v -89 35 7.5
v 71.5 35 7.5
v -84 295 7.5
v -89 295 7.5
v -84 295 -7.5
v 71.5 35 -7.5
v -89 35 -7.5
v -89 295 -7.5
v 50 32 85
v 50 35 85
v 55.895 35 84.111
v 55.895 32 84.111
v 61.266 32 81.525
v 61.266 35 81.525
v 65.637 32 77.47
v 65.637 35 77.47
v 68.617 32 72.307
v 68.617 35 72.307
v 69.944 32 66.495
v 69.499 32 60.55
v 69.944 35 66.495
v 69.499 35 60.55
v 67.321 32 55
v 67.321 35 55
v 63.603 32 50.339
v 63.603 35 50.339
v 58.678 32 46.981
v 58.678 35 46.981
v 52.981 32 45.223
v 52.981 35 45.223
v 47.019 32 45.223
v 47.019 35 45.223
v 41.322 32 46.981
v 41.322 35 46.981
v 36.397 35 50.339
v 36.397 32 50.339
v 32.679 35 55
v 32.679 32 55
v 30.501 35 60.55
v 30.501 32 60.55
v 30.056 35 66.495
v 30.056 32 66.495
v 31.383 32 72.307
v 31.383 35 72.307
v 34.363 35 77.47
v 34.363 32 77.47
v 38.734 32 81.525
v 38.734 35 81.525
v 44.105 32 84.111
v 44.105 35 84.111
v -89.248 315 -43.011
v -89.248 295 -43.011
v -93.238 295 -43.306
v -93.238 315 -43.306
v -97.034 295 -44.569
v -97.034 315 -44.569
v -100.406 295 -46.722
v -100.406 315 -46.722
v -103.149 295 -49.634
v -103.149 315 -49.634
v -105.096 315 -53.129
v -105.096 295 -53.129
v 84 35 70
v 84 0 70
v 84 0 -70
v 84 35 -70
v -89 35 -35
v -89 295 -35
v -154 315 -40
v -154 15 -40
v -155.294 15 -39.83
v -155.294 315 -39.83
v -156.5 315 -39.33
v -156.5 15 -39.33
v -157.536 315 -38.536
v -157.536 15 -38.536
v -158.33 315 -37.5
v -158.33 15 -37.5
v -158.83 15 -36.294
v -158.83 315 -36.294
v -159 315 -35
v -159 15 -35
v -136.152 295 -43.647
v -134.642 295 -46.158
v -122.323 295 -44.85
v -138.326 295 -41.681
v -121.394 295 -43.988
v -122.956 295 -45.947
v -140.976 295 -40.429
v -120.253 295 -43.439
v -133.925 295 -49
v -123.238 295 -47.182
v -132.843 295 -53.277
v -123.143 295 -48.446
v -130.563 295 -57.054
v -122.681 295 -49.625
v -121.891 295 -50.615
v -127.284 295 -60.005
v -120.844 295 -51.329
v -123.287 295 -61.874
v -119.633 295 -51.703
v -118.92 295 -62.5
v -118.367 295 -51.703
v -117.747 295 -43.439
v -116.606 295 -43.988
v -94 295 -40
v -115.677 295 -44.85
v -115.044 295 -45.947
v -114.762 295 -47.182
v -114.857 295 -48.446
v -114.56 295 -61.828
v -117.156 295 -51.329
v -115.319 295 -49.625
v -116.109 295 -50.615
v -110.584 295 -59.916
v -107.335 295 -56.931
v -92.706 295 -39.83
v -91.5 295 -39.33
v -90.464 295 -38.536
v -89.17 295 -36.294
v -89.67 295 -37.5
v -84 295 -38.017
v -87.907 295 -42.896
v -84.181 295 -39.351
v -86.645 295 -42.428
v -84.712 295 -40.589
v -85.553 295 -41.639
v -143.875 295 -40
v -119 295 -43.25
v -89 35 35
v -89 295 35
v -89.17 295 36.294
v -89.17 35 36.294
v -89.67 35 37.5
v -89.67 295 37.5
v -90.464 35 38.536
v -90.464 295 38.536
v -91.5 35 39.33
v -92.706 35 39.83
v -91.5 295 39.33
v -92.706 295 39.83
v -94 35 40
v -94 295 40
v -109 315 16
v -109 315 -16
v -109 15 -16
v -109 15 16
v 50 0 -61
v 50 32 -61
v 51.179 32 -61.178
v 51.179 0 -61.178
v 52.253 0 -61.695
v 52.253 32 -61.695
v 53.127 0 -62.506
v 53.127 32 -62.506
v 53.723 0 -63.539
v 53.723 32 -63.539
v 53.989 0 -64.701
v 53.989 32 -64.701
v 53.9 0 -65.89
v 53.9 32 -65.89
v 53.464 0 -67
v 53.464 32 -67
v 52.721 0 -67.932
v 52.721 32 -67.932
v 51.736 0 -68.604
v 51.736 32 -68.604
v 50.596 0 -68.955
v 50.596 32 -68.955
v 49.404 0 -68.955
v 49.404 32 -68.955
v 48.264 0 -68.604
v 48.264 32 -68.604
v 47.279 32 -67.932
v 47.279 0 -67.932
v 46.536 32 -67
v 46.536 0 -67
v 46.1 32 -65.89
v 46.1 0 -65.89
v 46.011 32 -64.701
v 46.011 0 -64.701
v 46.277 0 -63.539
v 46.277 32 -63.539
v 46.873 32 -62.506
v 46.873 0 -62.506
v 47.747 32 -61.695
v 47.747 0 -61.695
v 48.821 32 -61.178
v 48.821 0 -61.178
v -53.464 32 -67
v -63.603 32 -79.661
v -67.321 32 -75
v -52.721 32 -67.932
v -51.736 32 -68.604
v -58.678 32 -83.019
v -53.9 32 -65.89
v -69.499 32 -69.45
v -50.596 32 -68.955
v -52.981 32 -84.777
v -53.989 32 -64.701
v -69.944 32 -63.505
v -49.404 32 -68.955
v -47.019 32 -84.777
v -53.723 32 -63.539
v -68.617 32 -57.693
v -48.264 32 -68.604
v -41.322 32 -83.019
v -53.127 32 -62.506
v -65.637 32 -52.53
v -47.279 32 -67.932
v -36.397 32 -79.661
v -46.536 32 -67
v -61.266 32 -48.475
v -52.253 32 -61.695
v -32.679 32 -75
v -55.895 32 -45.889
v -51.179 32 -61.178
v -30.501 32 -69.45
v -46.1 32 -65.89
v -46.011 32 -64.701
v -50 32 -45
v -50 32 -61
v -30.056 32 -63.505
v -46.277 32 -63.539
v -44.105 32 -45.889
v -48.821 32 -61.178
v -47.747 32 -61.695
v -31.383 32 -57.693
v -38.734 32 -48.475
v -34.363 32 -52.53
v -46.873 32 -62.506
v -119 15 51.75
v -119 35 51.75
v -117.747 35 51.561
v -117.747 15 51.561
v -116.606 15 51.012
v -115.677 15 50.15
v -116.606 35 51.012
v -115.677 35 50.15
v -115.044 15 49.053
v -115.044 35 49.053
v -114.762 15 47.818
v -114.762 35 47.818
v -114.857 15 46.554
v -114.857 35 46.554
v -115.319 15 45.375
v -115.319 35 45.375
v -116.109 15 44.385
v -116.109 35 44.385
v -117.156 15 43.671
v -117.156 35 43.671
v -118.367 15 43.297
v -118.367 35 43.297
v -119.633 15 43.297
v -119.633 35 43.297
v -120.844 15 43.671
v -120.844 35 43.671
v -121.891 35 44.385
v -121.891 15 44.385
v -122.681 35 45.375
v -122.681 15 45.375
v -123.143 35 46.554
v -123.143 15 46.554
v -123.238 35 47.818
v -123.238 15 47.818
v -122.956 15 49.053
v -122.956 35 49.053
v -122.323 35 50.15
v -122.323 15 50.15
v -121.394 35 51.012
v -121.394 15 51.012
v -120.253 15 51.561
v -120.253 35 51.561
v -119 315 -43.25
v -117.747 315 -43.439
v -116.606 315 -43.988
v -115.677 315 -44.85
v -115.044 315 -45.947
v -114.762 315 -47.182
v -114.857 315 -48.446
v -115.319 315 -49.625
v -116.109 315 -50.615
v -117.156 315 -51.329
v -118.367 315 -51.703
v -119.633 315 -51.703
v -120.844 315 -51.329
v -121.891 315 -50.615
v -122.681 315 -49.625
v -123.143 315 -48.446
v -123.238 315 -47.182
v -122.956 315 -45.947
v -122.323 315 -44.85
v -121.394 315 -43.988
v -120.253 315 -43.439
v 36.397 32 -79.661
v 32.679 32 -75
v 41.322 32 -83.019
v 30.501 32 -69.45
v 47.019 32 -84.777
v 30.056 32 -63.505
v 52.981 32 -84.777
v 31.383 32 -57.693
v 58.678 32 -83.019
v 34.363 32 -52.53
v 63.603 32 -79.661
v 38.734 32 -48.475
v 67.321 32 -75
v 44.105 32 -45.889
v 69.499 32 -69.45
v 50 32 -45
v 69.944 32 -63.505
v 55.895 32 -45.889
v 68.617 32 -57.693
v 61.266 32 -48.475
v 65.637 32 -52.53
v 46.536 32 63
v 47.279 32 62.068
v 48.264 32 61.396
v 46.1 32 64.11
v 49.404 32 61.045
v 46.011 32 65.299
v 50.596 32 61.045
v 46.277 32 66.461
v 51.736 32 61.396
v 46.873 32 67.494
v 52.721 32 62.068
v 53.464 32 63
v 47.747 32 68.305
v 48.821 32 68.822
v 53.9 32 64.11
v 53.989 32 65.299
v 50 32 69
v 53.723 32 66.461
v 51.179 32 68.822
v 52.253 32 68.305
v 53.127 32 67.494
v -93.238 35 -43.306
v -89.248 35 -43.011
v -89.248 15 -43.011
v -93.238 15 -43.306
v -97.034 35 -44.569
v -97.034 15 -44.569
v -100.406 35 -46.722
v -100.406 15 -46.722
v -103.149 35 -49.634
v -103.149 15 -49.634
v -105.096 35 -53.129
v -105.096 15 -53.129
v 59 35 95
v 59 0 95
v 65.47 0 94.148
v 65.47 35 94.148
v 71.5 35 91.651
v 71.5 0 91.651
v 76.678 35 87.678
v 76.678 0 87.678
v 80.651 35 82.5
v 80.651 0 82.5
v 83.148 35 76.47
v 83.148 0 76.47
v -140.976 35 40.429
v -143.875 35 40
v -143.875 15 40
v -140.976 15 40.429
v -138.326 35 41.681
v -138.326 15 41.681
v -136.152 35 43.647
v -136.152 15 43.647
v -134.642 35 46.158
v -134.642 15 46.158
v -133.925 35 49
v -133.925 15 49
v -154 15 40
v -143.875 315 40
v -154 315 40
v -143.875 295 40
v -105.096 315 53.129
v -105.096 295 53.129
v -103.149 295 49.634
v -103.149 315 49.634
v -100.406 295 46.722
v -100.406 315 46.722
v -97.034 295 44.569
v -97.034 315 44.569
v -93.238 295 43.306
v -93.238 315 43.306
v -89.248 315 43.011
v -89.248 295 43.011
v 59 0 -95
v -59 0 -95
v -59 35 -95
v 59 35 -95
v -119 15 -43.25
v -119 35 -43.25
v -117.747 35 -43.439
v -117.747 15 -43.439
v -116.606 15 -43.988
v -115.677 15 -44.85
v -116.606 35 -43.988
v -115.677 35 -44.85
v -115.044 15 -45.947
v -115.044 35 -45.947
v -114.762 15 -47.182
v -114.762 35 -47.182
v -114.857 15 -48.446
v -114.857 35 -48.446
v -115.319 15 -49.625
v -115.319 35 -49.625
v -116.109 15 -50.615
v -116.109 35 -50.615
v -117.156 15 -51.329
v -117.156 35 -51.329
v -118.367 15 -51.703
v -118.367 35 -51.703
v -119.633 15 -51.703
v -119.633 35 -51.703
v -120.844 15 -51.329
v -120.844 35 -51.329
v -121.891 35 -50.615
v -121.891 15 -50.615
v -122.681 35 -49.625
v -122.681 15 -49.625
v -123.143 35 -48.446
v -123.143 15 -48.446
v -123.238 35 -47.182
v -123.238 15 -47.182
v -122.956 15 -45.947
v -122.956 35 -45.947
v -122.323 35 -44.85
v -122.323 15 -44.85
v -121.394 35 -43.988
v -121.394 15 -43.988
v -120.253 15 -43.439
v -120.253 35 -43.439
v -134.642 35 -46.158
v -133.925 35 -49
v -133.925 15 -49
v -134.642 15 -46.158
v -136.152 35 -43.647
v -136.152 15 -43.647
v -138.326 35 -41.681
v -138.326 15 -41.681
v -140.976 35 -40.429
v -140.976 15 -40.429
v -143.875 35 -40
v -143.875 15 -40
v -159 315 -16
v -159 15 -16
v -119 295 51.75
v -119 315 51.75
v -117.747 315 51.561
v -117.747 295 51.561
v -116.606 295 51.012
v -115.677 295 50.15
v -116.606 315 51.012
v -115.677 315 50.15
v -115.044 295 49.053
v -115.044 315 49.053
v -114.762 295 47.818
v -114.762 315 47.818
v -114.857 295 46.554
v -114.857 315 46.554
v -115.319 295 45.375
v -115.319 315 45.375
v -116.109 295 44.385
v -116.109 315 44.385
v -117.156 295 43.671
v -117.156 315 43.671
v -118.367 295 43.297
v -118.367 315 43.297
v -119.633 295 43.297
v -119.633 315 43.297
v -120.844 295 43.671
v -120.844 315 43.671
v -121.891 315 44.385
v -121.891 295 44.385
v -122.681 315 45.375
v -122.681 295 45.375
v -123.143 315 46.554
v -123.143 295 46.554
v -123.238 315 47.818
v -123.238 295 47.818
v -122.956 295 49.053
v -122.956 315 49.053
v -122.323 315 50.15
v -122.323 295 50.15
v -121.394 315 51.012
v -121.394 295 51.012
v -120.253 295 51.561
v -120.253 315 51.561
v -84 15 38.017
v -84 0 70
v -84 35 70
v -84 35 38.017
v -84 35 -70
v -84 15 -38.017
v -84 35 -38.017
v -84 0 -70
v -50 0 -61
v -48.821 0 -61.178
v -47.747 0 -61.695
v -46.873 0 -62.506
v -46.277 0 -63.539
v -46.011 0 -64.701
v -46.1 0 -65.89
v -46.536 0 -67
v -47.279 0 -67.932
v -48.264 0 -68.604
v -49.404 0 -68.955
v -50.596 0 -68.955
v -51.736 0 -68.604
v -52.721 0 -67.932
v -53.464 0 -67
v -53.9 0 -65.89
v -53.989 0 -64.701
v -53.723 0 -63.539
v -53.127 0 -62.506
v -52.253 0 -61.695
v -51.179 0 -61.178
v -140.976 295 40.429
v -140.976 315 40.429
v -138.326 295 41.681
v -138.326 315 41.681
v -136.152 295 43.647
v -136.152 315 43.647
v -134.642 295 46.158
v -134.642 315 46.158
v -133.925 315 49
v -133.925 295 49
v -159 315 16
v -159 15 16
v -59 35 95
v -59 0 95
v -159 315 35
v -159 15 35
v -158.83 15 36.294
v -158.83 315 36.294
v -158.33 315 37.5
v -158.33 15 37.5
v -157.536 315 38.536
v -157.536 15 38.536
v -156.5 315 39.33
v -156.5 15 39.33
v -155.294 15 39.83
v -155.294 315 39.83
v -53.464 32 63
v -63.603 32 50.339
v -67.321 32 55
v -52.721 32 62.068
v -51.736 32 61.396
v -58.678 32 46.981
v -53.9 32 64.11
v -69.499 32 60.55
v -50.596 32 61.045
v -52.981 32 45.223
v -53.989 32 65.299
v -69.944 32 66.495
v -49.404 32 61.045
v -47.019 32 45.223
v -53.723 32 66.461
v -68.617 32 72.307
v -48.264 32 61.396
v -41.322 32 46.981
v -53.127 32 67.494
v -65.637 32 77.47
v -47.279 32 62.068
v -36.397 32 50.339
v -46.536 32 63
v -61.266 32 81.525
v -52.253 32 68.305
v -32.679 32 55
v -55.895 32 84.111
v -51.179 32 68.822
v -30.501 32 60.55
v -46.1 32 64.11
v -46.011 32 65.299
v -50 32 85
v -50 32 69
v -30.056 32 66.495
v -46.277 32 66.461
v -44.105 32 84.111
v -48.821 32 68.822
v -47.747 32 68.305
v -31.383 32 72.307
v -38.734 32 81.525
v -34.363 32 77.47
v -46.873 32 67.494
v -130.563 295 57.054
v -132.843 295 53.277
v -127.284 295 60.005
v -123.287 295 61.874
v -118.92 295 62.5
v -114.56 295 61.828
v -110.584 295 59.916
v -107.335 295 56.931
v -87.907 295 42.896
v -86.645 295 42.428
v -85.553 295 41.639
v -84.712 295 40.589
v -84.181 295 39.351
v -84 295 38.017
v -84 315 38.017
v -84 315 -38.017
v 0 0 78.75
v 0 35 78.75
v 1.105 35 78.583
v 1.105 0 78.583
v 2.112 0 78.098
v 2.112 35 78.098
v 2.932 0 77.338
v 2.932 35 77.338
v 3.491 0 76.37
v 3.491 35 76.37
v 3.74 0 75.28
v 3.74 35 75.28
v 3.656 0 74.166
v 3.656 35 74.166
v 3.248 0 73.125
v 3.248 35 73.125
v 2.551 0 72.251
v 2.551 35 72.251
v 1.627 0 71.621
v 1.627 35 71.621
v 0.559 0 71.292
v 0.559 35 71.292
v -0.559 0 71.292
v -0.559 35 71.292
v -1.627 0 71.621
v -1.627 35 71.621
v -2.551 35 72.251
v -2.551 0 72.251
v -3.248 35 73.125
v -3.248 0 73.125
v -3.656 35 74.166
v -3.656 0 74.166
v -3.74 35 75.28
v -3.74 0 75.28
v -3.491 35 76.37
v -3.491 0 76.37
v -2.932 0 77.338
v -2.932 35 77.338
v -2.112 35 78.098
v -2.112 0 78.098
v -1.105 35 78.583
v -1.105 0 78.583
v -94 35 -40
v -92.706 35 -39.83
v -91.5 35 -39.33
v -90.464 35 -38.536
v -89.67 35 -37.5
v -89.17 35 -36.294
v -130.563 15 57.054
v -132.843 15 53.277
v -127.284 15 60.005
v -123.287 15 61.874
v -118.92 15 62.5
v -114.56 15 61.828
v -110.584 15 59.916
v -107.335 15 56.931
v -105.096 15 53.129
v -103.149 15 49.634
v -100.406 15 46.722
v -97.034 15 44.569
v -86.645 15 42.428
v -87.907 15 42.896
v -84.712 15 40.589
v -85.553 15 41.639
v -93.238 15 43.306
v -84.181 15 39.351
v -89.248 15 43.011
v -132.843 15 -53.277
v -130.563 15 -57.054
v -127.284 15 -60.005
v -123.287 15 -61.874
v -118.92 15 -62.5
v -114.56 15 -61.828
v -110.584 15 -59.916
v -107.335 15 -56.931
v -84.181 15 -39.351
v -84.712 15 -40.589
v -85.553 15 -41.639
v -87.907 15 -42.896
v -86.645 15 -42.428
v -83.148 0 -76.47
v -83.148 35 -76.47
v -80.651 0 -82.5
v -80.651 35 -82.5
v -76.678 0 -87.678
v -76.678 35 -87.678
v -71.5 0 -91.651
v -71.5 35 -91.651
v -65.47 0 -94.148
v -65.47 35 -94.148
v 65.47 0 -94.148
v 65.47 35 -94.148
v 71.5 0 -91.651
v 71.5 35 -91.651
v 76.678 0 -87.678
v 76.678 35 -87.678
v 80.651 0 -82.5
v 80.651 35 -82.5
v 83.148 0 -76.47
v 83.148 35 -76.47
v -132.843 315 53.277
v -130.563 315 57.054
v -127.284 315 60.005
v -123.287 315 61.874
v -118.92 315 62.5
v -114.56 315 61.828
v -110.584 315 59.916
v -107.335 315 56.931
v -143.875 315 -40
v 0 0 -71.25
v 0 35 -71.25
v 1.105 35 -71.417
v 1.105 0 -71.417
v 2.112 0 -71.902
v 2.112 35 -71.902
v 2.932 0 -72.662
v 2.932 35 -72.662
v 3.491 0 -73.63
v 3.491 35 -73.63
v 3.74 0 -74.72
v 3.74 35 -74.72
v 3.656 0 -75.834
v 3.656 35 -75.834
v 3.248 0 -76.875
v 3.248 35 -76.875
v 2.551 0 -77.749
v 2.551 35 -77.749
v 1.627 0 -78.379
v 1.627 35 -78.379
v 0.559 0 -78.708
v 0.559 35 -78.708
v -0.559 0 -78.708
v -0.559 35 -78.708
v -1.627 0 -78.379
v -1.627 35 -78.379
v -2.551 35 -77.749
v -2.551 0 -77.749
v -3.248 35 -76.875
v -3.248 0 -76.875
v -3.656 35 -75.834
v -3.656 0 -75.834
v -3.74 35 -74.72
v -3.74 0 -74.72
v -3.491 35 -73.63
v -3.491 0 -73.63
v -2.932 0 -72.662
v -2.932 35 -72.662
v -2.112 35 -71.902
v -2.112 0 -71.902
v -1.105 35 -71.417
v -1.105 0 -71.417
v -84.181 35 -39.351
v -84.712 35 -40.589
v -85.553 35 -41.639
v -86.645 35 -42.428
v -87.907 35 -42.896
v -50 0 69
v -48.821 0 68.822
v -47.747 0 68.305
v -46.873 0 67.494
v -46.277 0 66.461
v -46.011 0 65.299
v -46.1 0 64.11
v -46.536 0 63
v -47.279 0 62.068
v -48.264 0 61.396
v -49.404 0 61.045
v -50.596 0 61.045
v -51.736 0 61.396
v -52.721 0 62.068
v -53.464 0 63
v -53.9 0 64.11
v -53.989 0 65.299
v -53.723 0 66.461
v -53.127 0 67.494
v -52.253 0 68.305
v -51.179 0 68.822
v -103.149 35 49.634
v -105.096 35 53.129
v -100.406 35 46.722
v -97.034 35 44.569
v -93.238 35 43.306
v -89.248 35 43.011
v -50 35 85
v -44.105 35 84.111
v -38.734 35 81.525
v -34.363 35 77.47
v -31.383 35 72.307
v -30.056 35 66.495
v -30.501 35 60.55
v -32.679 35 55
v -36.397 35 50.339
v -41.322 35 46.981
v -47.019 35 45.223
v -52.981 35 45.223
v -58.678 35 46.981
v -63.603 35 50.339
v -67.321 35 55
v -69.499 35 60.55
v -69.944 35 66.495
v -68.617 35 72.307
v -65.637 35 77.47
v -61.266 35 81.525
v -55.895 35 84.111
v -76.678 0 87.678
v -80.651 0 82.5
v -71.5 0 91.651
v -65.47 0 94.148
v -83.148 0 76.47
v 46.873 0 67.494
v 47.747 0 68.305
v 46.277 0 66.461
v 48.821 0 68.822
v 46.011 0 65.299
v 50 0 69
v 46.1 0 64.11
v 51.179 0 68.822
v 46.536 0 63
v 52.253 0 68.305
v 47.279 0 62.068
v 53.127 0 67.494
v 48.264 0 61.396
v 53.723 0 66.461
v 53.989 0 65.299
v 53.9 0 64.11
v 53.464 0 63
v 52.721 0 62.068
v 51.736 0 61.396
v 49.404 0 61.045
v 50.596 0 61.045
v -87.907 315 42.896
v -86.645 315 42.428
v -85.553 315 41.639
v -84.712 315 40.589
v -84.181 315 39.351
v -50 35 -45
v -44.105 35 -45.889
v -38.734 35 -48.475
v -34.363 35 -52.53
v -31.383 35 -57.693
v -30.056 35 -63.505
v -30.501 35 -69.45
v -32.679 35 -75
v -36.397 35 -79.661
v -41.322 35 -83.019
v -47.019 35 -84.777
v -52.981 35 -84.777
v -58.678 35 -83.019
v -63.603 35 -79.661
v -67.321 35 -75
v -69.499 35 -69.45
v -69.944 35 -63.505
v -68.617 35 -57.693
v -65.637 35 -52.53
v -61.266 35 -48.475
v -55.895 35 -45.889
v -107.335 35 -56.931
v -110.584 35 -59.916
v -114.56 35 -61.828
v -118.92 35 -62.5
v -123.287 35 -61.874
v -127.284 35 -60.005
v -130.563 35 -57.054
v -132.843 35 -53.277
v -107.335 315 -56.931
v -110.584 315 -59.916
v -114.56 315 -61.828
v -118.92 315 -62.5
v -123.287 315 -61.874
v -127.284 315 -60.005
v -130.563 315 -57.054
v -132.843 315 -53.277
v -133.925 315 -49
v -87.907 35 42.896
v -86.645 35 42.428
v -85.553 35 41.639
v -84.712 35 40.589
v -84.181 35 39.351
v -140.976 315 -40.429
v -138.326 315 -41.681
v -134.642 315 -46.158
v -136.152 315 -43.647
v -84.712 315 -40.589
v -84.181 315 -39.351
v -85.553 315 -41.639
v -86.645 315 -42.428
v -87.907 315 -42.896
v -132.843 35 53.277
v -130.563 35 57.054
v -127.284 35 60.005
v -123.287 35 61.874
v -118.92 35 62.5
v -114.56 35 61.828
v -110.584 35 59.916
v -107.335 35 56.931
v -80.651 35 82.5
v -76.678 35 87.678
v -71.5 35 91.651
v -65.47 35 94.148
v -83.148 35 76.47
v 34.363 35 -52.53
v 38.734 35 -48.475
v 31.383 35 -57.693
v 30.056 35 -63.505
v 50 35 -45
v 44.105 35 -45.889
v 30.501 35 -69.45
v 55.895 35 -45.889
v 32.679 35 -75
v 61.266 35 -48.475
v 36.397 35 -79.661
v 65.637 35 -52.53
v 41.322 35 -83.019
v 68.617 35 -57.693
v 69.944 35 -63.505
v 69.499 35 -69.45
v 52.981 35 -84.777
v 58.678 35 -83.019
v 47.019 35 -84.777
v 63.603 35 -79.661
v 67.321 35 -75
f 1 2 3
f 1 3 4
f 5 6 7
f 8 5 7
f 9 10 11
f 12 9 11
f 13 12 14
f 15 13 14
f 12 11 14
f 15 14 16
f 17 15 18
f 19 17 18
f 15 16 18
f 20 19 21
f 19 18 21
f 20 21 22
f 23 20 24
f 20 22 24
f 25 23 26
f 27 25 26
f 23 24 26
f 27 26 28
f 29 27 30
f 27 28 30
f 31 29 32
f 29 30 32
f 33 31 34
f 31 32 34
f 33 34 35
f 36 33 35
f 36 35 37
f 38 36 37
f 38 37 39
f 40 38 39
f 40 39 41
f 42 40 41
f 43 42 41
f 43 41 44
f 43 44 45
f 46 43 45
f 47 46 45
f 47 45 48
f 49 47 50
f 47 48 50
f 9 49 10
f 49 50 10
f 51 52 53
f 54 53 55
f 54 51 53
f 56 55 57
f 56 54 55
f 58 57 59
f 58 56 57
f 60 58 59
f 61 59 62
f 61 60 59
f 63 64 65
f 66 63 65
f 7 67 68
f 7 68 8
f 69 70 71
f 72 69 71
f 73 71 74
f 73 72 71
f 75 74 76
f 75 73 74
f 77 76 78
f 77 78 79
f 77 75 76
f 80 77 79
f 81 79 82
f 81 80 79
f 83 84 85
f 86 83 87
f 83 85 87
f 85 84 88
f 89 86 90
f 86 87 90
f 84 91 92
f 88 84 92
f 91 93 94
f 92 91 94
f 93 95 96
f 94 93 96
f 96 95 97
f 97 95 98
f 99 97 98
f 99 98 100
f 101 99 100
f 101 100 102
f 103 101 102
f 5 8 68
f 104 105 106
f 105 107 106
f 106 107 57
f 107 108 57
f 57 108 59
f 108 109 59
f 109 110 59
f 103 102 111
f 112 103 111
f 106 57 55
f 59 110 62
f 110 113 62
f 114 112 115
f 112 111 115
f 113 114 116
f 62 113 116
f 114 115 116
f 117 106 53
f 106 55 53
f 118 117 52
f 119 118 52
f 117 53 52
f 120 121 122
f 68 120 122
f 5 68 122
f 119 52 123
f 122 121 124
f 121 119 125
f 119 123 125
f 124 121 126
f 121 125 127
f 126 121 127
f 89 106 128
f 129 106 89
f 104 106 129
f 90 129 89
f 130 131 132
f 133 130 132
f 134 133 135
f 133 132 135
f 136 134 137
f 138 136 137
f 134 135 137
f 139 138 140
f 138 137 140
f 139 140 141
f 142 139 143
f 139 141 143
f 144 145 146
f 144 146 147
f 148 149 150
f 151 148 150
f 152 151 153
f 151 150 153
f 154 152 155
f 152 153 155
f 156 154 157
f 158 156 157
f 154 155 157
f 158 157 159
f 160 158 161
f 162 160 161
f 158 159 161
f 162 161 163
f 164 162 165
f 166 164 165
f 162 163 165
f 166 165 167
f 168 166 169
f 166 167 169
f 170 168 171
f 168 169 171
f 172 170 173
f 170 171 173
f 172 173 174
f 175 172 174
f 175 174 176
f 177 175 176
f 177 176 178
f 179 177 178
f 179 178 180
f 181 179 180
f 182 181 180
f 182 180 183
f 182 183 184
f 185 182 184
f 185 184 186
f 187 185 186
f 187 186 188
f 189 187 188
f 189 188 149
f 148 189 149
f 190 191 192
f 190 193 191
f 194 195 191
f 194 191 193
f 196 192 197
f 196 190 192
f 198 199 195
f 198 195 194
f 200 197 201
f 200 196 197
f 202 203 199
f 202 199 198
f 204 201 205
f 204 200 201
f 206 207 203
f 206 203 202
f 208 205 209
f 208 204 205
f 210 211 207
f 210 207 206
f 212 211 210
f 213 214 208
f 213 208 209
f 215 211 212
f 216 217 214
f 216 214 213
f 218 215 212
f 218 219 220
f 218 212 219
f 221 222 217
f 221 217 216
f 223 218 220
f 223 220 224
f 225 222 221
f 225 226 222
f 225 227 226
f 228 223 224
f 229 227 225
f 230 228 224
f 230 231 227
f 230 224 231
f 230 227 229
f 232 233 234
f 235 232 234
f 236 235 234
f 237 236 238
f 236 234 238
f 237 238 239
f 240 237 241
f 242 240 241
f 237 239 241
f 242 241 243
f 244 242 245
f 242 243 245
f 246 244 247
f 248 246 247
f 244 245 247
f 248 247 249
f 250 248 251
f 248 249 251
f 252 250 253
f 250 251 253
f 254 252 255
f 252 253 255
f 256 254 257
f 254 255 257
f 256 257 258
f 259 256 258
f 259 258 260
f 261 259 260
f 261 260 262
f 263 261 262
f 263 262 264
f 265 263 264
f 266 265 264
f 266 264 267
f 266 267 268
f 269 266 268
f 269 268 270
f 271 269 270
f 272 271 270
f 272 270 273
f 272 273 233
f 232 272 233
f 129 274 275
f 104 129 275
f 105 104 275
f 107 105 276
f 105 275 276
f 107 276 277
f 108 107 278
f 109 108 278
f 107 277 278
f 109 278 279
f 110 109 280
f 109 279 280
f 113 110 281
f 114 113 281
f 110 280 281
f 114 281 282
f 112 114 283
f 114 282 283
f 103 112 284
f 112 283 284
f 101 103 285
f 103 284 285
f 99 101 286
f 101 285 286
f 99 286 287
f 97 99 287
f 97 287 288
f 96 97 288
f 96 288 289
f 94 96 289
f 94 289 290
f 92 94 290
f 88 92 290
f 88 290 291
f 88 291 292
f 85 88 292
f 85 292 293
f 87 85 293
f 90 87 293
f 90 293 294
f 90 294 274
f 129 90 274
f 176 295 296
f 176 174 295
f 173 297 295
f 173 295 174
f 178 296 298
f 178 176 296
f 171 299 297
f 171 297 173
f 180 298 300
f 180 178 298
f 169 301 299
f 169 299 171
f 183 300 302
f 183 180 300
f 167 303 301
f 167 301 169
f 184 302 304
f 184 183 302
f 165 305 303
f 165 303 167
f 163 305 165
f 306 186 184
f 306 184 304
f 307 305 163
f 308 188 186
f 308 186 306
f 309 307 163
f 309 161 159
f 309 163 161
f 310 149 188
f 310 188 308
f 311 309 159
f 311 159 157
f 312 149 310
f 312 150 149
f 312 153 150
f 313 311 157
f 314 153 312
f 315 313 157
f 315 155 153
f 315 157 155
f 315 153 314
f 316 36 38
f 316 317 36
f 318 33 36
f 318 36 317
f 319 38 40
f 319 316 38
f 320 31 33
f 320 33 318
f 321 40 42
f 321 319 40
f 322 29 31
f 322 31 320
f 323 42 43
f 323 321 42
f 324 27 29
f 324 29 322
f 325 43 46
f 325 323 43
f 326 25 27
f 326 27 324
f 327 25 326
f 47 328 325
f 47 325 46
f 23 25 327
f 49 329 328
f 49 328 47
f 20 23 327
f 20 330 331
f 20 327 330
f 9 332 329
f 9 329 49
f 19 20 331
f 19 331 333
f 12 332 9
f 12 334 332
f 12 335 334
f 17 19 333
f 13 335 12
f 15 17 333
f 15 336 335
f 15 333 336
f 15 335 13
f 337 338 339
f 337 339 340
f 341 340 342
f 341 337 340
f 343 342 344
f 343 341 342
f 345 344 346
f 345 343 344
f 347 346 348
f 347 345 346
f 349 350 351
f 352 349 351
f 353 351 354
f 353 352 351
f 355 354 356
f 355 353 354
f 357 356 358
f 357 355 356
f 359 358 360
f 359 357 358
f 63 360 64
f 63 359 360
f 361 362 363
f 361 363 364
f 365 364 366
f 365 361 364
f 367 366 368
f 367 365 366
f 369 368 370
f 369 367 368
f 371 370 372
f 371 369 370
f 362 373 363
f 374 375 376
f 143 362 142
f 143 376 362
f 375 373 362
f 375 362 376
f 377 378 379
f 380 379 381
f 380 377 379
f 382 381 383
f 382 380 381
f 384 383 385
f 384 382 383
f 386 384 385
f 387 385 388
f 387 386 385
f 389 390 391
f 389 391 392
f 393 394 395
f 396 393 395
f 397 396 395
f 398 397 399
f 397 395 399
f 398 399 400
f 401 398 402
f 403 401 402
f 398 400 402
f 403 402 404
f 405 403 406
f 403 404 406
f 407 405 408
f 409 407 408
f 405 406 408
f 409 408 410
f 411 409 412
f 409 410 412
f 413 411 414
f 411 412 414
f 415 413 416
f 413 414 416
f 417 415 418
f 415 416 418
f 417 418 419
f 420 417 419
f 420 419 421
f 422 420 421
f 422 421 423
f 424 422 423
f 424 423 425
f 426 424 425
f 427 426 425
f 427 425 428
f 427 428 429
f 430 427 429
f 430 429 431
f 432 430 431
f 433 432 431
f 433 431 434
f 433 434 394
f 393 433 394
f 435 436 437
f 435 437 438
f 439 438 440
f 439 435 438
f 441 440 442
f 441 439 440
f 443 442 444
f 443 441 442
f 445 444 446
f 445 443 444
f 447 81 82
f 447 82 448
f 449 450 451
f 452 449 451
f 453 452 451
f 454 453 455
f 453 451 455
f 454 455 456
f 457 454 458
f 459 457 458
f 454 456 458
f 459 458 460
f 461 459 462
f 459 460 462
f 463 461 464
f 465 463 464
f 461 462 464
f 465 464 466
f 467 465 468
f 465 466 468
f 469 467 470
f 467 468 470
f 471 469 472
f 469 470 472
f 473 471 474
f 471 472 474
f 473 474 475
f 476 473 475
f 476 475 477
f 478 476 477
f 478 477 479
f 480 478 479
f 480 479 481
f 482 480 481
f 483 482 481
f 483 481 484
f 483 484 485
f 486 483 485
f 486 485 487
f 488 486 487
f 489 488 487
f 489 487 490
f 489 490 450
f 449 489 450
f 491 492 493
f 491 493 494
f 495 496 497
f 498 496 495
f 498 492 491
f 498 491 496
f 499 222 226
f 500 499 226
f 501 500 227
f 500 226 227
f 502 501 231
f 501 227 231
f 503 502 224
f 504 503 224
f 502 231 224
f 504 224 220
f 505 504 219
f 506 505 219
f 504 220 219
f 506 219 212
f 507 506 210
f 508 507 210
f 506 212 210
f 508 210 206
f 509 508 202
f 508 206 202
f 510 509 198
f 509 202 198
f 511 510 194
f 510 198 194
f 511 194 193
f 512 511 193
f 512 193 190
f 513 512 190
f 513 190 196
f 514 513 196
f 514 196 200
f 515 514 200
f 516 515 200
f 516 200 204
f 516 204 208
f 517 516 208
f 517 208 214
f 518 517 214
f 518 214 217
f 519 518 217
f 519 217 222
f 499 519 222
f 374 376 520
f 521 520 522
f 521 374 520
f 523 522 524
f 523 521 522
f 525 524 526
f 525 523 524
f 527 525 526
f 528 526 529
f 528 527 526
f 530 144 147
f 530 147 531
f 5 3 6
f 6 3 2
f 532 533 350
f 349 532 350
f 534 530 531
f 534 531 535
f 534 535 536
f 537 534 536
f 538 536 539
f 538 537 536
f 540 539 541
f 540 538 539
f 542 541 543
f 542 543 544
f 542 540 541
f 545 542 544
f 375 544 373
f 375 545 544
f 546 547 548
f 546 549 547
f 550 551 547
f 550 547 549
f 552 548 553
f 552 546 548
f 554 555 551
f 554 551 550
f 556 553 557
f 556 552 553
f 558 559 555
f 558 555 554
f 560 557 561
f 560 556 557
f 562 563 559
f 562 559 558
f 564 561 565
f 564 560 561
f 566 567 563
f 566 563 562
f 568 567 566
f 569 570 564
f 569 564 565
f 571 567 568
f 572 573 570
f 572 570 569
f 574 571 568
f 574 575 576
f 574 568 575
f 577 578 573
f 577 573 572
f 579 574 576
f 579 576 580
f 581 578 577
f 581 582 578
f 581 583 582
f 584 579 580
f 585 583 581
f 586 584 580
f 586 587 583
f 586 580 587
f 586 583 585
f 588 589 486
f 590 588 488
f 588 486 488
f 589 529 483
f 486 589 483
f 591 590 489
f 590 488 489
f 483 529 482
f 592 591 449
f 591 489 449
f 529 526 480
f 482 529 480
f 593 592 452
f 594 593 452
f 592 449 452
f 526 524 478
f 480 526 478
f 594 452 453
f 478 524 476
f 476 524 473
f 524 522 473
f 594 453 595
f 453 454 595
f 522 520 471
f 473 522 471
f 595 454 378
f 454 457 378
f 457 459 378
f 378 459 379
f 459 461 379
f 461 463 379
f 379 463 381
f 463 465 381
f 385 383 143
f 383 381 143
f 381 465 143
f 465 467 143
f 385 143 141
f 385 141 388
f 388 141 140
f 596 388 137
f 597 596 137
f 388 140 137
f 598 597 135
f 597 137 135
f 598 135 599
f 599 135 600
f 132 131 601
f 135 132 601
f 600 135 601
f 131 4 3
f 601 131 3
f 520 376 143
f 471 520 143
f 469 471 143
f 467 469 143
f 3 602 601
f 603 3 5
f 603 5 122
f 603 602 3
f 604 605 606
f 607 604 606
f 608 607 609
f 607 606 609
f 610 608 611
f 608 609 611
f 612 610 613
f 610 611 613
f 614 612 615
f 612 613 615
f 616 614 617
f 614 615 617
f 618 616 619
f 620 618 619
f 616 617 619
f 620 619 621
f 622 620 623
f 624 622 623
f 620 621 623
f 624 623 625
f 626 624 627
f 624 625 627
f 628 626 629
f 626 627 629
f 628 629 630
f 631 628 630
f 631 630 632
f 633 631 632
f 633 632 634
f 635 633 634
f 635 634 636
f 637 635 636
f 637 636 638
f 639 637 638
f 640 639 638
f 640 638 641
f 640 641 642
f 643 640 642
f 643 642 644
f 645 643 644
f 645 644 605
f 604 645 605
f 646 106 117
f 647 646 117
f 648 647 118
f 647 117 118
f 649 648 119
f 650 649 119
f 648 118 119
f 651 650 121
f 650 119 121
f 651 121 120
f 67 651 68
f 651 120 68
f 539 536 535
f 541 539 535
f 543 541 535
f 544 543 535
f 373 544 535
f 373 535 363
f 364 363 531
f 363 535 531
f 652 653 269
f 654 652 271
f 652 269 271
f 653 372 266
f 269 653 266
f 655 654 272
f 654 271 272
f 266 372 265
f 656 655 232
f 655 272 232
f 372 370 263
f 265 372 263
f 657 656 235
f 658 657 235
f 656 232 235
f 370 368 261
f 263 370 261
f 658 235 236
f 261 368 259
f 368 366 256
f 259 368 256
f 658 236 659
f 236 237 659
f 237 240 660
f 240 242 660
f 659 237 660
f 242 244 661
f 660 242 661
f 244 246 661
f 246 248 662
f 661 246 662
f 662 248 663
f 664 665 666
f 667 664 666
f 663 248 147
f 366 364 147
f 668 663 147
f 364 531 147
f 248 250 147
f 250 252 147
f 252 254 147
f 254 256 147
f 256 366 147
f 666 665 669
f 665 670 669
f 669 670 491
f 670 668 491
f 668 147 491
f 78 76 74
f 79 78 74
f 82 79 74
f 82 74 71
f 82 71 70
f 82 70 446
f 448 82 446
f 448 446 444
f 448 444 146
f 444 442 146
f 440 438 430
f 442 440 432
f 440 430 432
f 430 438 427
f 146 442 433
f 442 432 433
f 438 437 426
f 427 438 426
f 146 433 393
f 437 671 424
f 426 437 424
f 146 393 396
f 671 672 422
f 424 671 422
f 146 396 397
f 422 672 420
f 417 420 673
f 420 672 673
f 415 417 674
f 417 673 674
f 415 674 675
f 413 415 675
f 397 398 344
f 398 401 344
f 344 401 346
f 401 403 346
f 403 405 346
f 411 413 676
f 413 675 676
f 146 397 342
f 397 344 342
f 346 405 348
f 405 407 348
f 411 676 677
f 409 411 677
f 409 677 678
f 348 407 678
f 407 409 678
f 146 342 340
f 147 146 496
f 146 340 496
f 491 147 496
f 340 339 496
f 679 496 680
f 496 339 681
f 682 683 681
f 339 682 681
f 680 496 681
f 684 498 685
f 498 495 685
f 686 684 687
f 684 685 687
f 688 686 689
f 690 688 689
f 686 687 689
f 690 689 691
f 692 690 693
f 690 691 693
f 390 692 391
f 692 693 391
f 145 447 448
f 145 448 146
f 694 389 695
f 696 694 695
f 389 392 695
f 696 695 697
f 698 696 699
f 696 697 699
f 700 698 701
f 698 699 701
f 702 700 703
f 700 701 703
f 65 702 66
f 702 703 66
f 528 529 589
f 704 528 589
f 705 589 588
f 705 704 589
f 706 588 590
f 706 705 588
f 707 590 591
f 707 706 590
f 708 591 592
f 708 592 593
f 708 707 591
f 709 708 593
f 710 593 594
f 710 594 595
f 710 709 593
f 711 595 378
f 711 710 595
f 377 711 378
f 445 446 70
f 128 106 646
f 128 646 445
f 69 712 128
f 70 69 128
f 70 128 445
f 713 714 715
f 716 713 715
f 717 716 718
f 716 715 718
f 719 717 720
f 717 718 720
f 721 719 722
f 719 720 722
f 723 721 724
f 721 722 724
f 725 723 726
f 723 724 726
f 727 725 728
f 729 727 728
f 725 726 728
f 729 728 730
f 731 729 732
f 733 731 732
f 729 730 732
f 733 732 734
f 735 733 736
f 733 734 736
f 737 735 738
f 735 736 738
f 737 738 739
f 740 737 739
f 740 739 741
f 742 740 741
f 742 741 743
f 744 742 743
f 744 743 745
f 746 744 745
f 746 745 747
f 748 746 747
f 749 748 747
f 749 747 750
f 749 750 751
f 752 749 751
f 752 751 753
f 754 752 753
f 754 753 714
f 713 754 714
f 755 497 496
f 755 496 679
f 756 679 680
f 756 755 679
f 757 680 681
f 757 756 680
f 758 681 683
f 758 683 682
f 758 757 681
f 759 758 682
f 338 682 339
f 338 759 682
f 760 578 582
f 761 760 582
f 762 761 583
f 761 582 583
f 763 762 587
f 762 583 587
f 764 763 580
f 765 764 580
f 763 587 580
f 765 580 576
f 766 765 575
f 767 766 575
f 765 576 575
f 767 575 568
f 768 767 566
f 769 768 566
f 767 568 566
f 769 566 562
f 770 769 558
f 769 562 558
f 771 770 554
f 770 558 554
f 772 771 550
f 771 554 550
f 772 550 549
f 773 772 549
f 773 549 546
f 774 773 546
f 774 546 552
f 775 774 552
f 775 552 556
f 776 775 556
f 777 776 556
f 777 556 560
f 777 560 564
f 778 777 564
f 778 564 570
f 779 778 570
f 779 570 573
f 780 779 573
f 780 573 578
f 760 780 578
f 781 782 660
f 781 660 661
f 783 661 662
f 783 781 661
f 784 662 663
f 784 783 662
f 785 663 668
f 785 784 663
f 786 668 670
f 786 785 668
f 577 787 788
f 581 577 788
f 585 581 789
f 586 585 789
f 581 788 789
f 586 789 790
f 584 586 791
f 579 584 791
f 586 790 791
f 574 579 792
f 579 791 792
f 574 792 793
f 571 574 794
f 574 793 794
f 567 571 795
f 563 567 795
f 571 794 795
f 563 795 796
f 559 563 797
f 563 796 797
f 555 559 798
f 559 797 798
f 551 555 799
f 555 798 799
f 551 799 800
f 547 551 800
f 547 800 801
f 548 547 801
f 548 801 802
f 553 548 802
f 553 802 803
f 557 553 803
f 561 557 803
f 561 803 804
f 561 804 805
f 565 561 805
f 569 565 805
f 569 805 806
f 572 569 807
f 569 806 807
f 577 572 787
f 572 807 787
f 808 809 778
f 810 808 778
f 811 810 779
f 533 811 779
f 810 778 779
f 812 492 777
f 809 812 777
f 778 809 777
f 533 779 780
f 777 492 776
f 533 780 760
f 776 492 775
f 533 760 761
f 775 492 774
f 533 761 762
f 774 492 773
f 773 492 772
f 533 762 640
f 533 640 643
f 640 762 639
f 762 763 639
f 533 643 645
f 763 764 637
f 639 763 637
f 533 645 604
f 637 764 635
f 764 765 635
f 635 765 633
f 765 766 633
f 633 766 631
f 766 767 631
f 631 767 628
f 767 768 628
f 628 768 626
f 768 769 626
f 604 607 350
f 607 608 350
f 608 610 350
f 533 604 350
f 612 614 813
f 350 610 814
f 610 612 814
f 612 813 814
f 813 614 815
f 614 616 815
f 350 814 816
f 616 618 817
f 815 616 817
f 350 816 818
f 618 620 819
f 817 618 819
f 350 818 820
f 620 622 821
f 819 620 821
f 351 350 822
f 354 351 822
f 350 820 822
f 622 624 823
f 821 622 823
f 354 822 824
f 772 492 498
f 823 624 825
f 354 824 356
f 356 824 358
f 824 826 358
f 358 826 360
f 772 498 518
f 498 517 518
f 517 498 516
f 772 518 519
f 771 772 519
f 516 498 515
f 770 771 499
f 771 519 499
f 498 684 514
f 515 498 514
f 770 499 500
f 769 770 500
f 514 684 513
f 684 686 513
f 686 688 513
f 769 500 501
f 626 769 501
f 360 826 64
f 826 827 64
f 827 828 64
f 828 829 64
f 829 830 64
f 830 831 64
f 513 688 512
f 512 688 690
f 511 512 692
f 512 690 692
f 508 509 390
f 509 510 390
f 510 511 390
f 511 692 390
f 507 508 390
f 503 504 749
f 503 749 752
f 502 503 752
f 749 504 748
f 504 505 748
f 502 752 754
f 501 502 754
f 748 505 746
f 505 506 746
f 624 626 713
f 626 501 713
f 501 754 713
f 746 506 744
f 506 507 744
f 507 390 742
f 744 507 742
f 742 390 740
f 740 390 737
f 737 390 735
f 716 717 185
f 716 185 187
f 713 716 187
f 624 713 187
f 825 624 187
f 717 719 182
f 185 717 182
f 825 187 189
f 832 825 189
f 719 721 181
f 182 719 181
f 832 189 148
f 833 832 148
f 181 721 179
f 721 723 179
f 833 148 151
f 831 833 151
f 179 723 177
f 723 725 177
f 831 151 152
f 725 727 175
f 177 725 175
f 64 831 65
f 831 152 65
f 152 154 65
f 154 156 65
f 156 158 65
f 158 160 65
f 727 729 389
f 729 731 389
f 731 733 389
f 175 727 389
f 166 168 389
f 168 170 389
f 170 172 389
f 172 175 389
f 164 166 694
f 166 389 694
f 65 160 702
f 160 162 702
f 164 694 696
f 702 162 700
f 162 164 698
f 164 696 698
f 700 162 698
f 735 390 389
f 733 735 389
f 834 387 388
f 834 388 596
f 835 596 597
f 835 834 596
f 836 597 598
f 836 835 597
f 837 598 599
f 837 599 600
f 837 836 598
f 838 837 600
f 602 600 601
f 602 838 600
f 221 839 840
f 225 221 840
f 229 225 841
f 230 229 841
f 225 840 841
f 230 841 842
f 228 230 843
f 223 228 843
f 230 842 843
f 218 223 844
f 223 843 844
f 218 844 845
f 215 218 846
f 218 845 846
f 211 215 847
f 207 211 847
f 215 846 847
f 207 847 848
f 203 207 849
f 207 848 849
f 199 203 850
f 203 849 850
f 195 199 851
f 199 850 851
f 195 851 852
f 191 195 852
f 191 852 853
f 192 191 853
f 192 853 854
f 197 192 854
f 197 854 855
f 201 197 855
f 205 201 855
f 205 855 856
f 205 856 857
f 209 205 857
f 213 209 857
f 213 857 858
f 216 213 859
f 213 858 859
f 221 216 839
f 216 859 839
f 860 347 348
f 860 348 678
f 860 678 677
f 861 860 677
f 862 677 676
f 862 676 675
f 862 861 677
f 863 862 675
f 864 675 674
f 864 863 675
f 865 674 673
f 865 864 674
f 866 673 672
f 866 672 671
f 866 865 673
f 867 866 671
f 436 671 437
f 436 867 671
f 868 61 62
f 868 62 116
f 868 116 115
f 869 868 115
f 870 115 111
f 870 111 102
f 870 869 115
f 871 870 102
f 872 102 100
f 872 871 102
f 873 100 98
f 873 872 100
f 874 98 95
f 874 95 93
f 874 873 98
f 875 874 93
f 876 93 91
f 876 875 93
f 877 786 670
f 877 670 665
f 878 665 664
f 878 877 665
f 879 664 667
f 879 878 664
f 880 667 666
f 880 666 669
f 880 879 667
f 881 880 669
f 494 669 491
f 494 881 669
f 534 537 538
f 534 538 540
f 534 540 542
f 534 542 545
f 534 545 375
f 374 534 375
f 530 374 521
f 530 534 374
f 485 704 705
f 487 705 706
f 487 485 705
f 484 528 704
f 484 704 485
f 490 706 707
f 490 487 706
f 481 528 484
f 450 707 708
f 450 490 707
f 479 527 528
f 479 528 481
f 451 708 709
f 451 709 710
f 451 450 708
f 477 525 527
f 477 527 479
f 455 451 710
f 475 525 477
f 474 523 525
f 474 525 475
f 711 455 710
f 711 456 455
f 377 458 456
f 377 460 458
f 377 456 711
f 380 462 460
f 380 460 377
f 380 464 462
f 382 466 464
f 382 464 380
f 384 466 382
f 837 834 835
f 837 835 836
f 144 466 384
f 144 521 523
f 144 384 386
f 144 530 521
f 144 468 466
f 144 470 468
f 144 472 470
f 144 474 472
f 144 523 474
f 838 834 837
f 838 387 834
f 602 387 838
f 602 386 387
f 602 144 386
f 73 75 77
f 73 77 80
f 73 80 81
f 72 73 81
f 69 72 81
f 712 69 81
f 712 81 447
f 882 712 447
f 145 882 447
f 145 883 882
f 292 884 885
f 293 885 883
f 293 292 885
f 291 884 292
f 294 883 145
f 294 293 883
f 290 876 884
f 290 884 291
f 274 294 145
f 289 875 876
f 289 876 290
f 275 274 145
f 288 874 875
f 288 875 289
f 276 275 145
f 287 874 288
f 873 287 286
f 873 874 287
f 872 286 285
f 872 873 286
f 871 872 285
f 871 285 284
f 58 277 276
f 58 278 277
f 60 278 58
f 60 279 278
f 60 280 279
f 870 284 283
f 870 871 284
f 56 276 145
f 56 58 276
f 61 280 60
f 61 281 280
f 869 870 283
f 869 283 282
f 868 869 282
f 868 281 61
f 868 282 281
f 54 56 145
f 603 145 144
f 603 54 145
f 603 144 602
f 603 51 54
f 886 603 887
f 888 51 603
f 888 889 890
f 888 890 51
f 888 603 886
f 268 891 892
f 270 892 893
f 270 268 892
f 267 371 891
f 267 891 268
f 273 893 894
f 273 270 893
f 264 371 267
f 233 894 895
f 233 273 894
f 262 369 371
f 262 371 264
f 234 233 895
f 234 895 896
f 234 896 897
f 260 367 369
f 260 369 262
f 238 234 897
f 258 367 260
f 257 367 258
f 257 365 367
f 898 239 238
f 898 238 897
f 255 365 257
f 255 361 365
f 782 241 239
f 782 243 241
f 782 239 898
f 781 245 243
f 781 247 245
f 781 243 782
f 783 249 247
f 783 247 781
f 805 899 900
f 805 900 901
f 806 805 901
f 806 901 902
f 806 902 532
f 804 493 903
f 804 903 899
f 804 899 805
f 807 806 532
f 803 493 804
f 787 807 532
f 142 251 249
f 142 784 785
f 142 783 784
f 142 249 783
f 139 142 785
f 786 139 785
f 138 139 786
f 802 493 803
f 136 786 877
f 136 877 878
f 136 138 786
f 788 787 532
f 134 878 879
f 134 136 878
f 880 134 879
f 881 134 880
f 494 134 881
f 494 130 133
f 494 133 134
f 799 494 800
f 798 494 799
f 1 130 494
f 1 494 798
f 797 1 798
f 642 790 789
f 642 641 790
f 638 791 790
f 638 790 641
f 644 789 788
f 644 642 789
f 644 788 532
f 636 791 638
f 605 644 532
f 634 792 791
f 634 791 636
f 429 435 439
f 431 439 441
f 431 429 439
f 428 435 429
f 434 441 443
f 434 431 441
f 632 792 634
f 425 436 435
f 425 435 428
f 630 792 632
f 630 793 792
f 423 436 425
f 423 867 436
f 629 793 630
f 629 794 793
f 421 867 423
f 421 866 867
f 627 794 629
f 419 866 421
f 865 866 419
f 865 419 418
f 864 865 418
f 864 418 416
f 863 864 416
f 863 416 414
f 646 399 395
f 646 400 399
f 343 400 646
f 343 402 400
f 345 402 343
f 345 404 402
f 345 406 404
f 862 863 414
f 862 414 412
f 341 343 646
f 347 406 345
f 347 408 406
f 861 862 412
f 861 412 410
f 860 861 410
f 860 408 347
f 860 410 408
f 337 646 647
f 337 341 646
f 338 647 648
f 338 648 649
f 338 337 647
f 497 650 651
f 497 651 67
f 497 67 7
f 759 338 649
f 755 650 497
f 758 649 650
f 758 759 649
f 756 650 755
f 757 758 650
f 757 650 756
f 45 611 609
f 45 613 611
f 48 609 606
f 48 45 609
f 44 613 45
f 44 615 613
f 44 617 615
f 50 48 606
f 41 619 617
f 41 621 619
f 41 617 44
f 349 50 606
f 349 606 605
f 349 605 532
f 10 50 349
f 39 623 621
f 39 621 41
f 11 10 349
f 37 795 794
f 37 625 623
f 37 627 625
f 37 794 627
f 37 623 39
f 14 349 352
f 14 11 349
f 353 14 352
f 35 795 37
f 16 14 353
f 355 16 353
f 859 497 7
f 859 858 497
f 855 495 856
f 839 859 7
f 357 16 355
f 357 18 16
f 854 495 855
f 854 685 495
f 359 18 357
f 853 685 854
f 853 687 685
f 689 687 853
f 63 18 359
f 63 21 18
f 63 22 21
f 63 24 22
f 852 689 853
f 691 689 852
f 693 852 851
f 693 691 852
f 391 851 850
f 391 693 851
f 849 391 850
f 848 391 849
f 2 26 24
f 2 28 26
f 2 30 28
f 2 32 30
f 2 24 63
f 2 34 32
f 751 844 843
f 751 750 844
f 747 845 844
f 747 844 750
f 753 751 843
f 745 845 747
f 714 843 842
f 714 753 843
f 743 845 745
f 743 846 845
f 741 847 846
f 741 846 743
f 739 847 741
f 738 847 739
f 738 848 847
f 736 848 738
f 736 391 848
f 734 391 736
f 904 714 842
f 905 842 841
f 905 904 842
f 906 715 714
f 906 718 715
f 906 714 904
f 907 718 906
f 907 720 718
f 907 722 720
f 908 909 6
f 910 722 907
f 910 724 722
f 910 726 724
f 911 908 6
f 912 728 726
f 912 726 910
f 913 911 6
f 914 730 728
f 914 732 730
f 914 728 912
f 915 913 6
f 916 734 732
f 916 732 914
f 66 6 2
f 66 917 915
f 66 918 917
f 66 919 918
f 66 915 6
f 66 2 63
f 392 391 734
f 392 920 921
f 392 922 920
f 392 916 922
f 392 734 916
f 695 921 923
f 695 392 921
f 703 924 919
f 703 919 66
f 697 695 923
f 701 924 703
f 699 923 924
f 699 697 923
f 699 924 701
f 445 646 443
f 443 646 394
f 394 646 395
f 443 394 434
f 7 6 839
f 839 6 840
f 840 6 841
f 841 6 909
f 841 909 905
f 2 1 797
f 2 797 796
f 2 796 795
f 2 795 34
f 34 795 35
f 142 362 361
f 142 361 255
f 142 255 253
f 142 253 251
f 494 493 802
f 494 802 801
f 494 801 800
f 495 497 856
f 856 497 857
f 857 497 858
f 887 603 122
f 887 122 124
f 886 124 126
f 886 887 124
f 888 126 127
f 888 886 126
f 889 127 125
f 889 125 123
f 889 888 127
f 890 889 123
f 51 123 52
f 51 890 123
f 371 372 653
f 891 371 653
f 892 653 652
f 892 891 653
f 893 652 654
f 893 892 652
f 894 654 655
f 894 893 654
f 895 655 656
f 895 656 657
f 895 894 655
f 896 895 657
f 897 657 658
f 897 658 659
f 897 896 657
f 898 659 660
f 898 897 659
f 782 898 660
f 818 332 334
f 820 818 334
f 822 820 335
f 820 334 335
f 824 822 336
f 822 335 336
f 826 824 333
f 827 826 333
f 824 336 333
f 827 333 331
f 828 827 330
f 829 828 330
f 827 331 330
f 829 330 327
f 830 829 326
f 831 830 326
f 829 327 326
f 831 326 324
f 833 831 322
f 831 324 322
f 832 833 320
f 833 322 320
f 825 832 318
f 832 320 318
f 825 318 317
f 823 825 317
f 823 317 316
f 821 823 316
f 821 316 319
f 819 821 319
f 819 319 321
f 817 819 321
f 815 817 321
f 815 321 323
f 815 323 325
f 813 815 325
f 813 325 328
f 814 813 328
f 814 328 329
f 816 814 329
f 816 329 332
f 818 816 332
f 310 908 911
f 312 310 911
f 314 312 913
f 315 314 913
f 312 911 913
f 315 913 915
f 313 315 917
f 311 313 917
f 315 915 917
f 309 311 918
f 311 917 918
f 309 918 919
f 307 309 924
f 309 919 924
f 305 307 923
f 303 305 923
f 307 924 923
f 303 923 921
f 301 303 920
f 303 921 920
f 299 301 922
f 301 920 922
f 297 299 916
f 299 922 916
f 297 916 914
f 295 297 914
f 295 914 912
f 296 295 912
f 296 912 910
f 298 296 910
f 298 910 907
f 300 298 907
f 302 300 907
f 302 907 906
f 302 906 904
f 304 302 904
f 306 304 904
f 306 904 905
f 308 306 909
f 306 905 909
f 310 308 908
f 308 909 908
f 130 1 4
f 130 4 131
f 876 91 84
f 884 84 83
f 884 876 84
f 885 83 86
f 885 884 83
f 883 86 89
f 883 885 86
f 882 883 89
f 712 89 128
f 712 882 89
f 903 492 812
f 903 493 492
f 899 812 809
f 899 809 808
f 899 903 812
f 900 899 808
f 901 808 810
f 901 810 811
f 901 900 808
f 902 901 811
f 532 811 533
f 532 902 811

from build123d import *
from build123d.topology import SkipClean

# Parameters (mm, degrees)
SKETCH_2_W          = 168
SKETCH_2_H          = 190
EXTRUDE_1_DEPTH     = 35
CUT_EXTRUDE_1_REACH = 133.552
SKETCH_3_R          = 3.75
CUT_EXTRUDE_2_REACH = 133.552
SKETCH_4_R          = 4
SKETCH_5_R          = 20
CUT_EXTRUDE_3_DEPTH = 3
FILLET_1_R          = 25
EXTRUDE_2_DEPTH     = 300
CUT_EXTRUDE_START   = 260
CUT_EXTRUDE_4_DEPTH = 260
EXTRUDE_3_DEPTH     = 7.5
SKETCH_12_R         = 4.25
CUT_EXTRUDE_5_DEPTH = 366.418937659


with BuildPart() as part:
    # 草图2 → 凸台-拉伸1 (new body)
    with BuildSketch(Plane(origin=(0, 0, 0), x_dir=(1, 0, 0), z_dir=(0, 1, 0))):
        Rectangle(SKETCH_2_W, SKETCH_2_H)
    extrude(amount=EXTRUDE_1_DEPTH)

    # 草图3 → 切除-拉伸1 (cut, up to next)
    with BuildSketch(Plane(origin=(0, 35, 0), x_dir=(1, 0, 0), z_dir=(0, 1, 0)), mode=Mode.PRIVATE) as cut_extrude_1_sk1:
        with Locations((0, 75)):
            Circle(SKETCH_3_R)
    cut_extrude_1_tool1 = extrude(cut_extrude_1_sk1.sketch, amount=-CUT_EXTRUDE_1_REACH, mode=Mode.PRIVATE) & part.part
    # 草图3 → 切除-拉伸1 (cut, up to next)
    with BuildSketch(Plane(origin=(0, 35, 0), x_dir=(1, 0, 0), z_dir=(0, 1, 0)), mode=Mode.PRIVATE) as cut_extrude_1_sk2:
        with Locations((0, -75)):
            Circle(SKETCH_3_R)
    cut_extrude_1_tool2 = extrude(cut_extrude_1_sk2.sketch, amount=-CUT_EXTRUDE_1_REACH, mode=Mode.PRIVATE) & part.part
    add(cut_extrude_1_tool1.solids().sort_by_distance((0, 35, -75))[0], mode=Mode.SUBTRACT)
    add(cut_extrude_1_tool2.solids().sort_by_distance((0, 35, 75))[0], mode=Mode.SUBTRACT)

    # 草图4 → 切除-拉伸2 (cut, up to next)
    with BuildSketch(Plane(origin=(0, 35, 0), x_dir=(1, 0, 0), z_dir=(0, 1, 0)), mode=Mode.PRIVATE) as cut_extrude_2_sk1:
        with Locations((-50, 65)):
            Circle(SKETCH_4_R)
    cut_extrude_2_tool1 = extrude(cut_extrude_2_sk1.sketch, amount=-CUT_EXTRUDE_2_REACH, mode=Mode.PRIVATE) & part.part
    # 草图4 → 切除-拉伸2 (cut, up to next)
    with BuildSketch(Plane(origin=(0, 35, 0), x_dir=(1, 0, 0), z_dir=(0, 1, 0)), mode=Mode.PRIVATE) as cut_extrude_2_sk2:
        with Locations((50, 65)):
            Circle(SKETCH_4_R)
    cut_extrude_2_tool2 = extrude(cut_extrude_2_sk2.sketch, amount=-CUT_EXTRUDE_2_REACH, mode=Mode.PRIVATE) & part.part
    # 草图4 → 切除-拉伸2 (cut, up to next)
    with BuildSketch(Plane(origin=(0, 35, 0), x_dir=(1, 0, 0), z_dir=(0, 1, 0)), mode=Mode.PRIVATE) as cut_extrude_2_sk3:
        with Locations((-50, -65)):
            Circle(SKETCH_4_R)
    cut_extrude_2_tool3 = extrude(cut_extrude_2_sk3.sketch, amount=-CUT_EXTRUDE_2_REACH, mode=Mode.PRIVATE) & part.part
    # 草图4 → 切除-拉伸2 (cut, up to next)
    with BuildSketch(Plane(origin=(0, 35, 0), x_dir=(1, 0, 0), z_dir=(0, 1, 0)), mode=Mode.PRIVATE) as cut_extrude_2_sk4:
        with Locations((50, -65)):
            Circle(SKETCH_4_R)
    cut_extrude_2_tool4 = extrude(cut_extrude_2_sk4.sketch, amount=-CUT_EXTRUDE_2_REACH, mode=Mode.PRIVATE) & part.part
    add(cut_extrude_2_tool1.solids().sort_by_distance((-50, 35, -65))[0], mode=Mode.SUBTRACT)
    add(cut_extrude_2_tool2.solids().sort_by_distance((50, 35, -65))[0], mode=Mode.SUBTRACT)
    add(cut_extrude_2_tool3.solids().sort_by_distance((-50, 35, 65))[0], mode=Mode.SUBTRACT)
    add(cut_extrude_2_tool4.solids().sort_by_distance((50, 35, 65))[0], mode=Mode.SUBTRACT)

    # 草图5 → 切除-拉伸3 (cut)
    with BuildSketch(Plane(origin=(0, 35, 0), x_dir=(1, 0, 0), z_dir=(0, 1, 0))):
        with Locations((-50, 65)):
            Circle(SKETCH_5_R)
        with Locations((50, 65)):
            Circle(SKETCH_5_R)
        with Locations((50, -65)):
            Circle(SKETCH_5_R)
        with Locations((-50, -65)):
            Circle(SKETCH_5_R)
    extrude(amount=-CUT_EXTRUDE_3_DEPTH, mode=Mode.SUBTRACT)

    # 圆角1
    fillet_1_edges = [part.edges().sort_by_distance(p)[0] for p in [
        (-84, 17.5, -95),
        (84, 17.5, -95),
        (84, 17.5, 95),
        (-84, 17.5, 95),
    ]]
    fillet(fillet_1_edges, radius=FILLET_1_R)

    # 草图8 → 凸台-拉伸2 (add)
    with BuildSketch(Plane(origin=(0, 315, 0), x_dir=(1, 0, 0), z_dir=(0, 1, 0))):
        with BuildLine():
            Line((-109, 16), (-109, -16))
            Line((-109, -16), (-159, -16))
            Line((-159, -16), (-159, -35))
            ThreePointArc((-159, -35), (-157.535533906, -38.535533906), (-154, -40))
            Line((-154, -40), (-143.874685928, -40))
            ThreePointArc((-143.874685928, -40), (-137.166481995, -42.583801513), (-133.924811557, -49))
            ThreePointArc((-133.924811557, -49), (-121.126812284, -62.348456806), (-105.096341116, -53.129233486))
            ThreePointArc((-105.096341116, -53.129233486), (-98.786961451, -45.541087589), (-89.248249261, -43.01102837))
            ThreePointArc((-89.248249261, -43.01102837), (-85.553352811, -41.639435016), (-84, -38.017194942))
            Line((-84, -38.017194942), (-84, 38.017194942))
            ThreePointArc((-84, 38.017194942), (-85.553352811, 41.639435016), (-89.248249261, 43.01102837))
            ThreePointArc((-89.248249261, 43.01102837), (-98.786961451, 45.541087589), (-105.096341116, 53.129233486))
            ThreePointArc((-105.096341116, 53.129233486), (-121.126812284, 62.348456806), (-133.924811557, 49))
            ThreePointArc((-133.924811557, 49), (-137.166481995, 42.583801513), (-143.874685928, 40))
            Line((-143.874685928, 40), (-154, 40))
            ThreePointArc((-154, 40), (-157.535533906, 38.535533906), (-159, 35))
            Line((-159, 35), (-159, 16))
            Line((-159, 16), (-109, 16))
        make_face()
    extrude(amount=-EXTRUDE_2_DEPTH)

    # 草图10 → 切除-拉伸4 (cut)
    with SkipClean():  # the faces are left unmerged after this step: merging them gives an invalid solid
        with BuildSketch(Plane(origin=(0, 35, 0), x_dir=(1, 0, 0), z_dir=(0, 1, 0)).offset(CUT_EXTRUDE_START)):
            with BuildLine():
                ThreePointArc((-94, 40), (-90.464466094, 38.535533906), (-89, 35))
                Line((-89, 35), (-89, -35))
                ThreePointArc((-89, -35), (-90.464466094, -38.535533906), (-94, -40))
                Line((-94, -40), (-154, -40))
                ThreePointArc((-154, -40), (-157.535533906, -38.535533906), (-159, -35))
                Line((-159, -35), (-159, -16))
                Line((-159, -16), (-166.391829747, -16))
                Line((-166.391829747, -16), (-166.391829747, -67.593352797))
                Line((-166.391829747, -67.593352797), (-78.896973025, -67.593352797))
                Line((-78.896973025, -67.593352797), (-78.896973025, 67.593352797))
                Line((-78.896973025, 67.593352797), (-166.391829747, 67.593352797))
                Line((-166.391829747, 67.593352797), (-166.391829747, 16))
                Line((-166.391829747, 16), (-159, 16))
                Line((-159, 16), (-159, 35))
                ThreePointArc((-159, 35), (-157.535533906, 38.535533906), (-154, 40))
                Line((-154, 40), (-94, 40))
            make_face()
        extrude(amount=-CUT_EXTRUDE_4_DEPTH, mode=Mode.SUBTRACT)
    add(part.part.scale(1), mode=Mode.REPLACE)  # the faces are merged on a copy

    # 草图11 → 凸台-拉伸3 (add, symmetric)
    with BuildSketch(Plane.XY):
        Polygon((-84, 295), (71.5, 35), (-89.248249261, 35), (-89.248249261, 295), align=None)
    extrude(amount=EXTRUDE_3_DEPTH, both=True)

    # 草图12 → 切除-拉伸5 (cut, through all)
    with BuildSketch(Plane(origin=(0, 315, 0), x_dir=(1, 0, 0), z_dir=(0, 1, 0))):
        with Locations((-119, 47.5)):
            Circle(SKETCH_12_R)
        with Locations((-119, -47.5)):
            Circle(SKETCH_12_R)
    extrude(amount=-CUT_EXTRUDE_5_DEPTH, mode=Mode.SUBTRACT)


solid = part.part
